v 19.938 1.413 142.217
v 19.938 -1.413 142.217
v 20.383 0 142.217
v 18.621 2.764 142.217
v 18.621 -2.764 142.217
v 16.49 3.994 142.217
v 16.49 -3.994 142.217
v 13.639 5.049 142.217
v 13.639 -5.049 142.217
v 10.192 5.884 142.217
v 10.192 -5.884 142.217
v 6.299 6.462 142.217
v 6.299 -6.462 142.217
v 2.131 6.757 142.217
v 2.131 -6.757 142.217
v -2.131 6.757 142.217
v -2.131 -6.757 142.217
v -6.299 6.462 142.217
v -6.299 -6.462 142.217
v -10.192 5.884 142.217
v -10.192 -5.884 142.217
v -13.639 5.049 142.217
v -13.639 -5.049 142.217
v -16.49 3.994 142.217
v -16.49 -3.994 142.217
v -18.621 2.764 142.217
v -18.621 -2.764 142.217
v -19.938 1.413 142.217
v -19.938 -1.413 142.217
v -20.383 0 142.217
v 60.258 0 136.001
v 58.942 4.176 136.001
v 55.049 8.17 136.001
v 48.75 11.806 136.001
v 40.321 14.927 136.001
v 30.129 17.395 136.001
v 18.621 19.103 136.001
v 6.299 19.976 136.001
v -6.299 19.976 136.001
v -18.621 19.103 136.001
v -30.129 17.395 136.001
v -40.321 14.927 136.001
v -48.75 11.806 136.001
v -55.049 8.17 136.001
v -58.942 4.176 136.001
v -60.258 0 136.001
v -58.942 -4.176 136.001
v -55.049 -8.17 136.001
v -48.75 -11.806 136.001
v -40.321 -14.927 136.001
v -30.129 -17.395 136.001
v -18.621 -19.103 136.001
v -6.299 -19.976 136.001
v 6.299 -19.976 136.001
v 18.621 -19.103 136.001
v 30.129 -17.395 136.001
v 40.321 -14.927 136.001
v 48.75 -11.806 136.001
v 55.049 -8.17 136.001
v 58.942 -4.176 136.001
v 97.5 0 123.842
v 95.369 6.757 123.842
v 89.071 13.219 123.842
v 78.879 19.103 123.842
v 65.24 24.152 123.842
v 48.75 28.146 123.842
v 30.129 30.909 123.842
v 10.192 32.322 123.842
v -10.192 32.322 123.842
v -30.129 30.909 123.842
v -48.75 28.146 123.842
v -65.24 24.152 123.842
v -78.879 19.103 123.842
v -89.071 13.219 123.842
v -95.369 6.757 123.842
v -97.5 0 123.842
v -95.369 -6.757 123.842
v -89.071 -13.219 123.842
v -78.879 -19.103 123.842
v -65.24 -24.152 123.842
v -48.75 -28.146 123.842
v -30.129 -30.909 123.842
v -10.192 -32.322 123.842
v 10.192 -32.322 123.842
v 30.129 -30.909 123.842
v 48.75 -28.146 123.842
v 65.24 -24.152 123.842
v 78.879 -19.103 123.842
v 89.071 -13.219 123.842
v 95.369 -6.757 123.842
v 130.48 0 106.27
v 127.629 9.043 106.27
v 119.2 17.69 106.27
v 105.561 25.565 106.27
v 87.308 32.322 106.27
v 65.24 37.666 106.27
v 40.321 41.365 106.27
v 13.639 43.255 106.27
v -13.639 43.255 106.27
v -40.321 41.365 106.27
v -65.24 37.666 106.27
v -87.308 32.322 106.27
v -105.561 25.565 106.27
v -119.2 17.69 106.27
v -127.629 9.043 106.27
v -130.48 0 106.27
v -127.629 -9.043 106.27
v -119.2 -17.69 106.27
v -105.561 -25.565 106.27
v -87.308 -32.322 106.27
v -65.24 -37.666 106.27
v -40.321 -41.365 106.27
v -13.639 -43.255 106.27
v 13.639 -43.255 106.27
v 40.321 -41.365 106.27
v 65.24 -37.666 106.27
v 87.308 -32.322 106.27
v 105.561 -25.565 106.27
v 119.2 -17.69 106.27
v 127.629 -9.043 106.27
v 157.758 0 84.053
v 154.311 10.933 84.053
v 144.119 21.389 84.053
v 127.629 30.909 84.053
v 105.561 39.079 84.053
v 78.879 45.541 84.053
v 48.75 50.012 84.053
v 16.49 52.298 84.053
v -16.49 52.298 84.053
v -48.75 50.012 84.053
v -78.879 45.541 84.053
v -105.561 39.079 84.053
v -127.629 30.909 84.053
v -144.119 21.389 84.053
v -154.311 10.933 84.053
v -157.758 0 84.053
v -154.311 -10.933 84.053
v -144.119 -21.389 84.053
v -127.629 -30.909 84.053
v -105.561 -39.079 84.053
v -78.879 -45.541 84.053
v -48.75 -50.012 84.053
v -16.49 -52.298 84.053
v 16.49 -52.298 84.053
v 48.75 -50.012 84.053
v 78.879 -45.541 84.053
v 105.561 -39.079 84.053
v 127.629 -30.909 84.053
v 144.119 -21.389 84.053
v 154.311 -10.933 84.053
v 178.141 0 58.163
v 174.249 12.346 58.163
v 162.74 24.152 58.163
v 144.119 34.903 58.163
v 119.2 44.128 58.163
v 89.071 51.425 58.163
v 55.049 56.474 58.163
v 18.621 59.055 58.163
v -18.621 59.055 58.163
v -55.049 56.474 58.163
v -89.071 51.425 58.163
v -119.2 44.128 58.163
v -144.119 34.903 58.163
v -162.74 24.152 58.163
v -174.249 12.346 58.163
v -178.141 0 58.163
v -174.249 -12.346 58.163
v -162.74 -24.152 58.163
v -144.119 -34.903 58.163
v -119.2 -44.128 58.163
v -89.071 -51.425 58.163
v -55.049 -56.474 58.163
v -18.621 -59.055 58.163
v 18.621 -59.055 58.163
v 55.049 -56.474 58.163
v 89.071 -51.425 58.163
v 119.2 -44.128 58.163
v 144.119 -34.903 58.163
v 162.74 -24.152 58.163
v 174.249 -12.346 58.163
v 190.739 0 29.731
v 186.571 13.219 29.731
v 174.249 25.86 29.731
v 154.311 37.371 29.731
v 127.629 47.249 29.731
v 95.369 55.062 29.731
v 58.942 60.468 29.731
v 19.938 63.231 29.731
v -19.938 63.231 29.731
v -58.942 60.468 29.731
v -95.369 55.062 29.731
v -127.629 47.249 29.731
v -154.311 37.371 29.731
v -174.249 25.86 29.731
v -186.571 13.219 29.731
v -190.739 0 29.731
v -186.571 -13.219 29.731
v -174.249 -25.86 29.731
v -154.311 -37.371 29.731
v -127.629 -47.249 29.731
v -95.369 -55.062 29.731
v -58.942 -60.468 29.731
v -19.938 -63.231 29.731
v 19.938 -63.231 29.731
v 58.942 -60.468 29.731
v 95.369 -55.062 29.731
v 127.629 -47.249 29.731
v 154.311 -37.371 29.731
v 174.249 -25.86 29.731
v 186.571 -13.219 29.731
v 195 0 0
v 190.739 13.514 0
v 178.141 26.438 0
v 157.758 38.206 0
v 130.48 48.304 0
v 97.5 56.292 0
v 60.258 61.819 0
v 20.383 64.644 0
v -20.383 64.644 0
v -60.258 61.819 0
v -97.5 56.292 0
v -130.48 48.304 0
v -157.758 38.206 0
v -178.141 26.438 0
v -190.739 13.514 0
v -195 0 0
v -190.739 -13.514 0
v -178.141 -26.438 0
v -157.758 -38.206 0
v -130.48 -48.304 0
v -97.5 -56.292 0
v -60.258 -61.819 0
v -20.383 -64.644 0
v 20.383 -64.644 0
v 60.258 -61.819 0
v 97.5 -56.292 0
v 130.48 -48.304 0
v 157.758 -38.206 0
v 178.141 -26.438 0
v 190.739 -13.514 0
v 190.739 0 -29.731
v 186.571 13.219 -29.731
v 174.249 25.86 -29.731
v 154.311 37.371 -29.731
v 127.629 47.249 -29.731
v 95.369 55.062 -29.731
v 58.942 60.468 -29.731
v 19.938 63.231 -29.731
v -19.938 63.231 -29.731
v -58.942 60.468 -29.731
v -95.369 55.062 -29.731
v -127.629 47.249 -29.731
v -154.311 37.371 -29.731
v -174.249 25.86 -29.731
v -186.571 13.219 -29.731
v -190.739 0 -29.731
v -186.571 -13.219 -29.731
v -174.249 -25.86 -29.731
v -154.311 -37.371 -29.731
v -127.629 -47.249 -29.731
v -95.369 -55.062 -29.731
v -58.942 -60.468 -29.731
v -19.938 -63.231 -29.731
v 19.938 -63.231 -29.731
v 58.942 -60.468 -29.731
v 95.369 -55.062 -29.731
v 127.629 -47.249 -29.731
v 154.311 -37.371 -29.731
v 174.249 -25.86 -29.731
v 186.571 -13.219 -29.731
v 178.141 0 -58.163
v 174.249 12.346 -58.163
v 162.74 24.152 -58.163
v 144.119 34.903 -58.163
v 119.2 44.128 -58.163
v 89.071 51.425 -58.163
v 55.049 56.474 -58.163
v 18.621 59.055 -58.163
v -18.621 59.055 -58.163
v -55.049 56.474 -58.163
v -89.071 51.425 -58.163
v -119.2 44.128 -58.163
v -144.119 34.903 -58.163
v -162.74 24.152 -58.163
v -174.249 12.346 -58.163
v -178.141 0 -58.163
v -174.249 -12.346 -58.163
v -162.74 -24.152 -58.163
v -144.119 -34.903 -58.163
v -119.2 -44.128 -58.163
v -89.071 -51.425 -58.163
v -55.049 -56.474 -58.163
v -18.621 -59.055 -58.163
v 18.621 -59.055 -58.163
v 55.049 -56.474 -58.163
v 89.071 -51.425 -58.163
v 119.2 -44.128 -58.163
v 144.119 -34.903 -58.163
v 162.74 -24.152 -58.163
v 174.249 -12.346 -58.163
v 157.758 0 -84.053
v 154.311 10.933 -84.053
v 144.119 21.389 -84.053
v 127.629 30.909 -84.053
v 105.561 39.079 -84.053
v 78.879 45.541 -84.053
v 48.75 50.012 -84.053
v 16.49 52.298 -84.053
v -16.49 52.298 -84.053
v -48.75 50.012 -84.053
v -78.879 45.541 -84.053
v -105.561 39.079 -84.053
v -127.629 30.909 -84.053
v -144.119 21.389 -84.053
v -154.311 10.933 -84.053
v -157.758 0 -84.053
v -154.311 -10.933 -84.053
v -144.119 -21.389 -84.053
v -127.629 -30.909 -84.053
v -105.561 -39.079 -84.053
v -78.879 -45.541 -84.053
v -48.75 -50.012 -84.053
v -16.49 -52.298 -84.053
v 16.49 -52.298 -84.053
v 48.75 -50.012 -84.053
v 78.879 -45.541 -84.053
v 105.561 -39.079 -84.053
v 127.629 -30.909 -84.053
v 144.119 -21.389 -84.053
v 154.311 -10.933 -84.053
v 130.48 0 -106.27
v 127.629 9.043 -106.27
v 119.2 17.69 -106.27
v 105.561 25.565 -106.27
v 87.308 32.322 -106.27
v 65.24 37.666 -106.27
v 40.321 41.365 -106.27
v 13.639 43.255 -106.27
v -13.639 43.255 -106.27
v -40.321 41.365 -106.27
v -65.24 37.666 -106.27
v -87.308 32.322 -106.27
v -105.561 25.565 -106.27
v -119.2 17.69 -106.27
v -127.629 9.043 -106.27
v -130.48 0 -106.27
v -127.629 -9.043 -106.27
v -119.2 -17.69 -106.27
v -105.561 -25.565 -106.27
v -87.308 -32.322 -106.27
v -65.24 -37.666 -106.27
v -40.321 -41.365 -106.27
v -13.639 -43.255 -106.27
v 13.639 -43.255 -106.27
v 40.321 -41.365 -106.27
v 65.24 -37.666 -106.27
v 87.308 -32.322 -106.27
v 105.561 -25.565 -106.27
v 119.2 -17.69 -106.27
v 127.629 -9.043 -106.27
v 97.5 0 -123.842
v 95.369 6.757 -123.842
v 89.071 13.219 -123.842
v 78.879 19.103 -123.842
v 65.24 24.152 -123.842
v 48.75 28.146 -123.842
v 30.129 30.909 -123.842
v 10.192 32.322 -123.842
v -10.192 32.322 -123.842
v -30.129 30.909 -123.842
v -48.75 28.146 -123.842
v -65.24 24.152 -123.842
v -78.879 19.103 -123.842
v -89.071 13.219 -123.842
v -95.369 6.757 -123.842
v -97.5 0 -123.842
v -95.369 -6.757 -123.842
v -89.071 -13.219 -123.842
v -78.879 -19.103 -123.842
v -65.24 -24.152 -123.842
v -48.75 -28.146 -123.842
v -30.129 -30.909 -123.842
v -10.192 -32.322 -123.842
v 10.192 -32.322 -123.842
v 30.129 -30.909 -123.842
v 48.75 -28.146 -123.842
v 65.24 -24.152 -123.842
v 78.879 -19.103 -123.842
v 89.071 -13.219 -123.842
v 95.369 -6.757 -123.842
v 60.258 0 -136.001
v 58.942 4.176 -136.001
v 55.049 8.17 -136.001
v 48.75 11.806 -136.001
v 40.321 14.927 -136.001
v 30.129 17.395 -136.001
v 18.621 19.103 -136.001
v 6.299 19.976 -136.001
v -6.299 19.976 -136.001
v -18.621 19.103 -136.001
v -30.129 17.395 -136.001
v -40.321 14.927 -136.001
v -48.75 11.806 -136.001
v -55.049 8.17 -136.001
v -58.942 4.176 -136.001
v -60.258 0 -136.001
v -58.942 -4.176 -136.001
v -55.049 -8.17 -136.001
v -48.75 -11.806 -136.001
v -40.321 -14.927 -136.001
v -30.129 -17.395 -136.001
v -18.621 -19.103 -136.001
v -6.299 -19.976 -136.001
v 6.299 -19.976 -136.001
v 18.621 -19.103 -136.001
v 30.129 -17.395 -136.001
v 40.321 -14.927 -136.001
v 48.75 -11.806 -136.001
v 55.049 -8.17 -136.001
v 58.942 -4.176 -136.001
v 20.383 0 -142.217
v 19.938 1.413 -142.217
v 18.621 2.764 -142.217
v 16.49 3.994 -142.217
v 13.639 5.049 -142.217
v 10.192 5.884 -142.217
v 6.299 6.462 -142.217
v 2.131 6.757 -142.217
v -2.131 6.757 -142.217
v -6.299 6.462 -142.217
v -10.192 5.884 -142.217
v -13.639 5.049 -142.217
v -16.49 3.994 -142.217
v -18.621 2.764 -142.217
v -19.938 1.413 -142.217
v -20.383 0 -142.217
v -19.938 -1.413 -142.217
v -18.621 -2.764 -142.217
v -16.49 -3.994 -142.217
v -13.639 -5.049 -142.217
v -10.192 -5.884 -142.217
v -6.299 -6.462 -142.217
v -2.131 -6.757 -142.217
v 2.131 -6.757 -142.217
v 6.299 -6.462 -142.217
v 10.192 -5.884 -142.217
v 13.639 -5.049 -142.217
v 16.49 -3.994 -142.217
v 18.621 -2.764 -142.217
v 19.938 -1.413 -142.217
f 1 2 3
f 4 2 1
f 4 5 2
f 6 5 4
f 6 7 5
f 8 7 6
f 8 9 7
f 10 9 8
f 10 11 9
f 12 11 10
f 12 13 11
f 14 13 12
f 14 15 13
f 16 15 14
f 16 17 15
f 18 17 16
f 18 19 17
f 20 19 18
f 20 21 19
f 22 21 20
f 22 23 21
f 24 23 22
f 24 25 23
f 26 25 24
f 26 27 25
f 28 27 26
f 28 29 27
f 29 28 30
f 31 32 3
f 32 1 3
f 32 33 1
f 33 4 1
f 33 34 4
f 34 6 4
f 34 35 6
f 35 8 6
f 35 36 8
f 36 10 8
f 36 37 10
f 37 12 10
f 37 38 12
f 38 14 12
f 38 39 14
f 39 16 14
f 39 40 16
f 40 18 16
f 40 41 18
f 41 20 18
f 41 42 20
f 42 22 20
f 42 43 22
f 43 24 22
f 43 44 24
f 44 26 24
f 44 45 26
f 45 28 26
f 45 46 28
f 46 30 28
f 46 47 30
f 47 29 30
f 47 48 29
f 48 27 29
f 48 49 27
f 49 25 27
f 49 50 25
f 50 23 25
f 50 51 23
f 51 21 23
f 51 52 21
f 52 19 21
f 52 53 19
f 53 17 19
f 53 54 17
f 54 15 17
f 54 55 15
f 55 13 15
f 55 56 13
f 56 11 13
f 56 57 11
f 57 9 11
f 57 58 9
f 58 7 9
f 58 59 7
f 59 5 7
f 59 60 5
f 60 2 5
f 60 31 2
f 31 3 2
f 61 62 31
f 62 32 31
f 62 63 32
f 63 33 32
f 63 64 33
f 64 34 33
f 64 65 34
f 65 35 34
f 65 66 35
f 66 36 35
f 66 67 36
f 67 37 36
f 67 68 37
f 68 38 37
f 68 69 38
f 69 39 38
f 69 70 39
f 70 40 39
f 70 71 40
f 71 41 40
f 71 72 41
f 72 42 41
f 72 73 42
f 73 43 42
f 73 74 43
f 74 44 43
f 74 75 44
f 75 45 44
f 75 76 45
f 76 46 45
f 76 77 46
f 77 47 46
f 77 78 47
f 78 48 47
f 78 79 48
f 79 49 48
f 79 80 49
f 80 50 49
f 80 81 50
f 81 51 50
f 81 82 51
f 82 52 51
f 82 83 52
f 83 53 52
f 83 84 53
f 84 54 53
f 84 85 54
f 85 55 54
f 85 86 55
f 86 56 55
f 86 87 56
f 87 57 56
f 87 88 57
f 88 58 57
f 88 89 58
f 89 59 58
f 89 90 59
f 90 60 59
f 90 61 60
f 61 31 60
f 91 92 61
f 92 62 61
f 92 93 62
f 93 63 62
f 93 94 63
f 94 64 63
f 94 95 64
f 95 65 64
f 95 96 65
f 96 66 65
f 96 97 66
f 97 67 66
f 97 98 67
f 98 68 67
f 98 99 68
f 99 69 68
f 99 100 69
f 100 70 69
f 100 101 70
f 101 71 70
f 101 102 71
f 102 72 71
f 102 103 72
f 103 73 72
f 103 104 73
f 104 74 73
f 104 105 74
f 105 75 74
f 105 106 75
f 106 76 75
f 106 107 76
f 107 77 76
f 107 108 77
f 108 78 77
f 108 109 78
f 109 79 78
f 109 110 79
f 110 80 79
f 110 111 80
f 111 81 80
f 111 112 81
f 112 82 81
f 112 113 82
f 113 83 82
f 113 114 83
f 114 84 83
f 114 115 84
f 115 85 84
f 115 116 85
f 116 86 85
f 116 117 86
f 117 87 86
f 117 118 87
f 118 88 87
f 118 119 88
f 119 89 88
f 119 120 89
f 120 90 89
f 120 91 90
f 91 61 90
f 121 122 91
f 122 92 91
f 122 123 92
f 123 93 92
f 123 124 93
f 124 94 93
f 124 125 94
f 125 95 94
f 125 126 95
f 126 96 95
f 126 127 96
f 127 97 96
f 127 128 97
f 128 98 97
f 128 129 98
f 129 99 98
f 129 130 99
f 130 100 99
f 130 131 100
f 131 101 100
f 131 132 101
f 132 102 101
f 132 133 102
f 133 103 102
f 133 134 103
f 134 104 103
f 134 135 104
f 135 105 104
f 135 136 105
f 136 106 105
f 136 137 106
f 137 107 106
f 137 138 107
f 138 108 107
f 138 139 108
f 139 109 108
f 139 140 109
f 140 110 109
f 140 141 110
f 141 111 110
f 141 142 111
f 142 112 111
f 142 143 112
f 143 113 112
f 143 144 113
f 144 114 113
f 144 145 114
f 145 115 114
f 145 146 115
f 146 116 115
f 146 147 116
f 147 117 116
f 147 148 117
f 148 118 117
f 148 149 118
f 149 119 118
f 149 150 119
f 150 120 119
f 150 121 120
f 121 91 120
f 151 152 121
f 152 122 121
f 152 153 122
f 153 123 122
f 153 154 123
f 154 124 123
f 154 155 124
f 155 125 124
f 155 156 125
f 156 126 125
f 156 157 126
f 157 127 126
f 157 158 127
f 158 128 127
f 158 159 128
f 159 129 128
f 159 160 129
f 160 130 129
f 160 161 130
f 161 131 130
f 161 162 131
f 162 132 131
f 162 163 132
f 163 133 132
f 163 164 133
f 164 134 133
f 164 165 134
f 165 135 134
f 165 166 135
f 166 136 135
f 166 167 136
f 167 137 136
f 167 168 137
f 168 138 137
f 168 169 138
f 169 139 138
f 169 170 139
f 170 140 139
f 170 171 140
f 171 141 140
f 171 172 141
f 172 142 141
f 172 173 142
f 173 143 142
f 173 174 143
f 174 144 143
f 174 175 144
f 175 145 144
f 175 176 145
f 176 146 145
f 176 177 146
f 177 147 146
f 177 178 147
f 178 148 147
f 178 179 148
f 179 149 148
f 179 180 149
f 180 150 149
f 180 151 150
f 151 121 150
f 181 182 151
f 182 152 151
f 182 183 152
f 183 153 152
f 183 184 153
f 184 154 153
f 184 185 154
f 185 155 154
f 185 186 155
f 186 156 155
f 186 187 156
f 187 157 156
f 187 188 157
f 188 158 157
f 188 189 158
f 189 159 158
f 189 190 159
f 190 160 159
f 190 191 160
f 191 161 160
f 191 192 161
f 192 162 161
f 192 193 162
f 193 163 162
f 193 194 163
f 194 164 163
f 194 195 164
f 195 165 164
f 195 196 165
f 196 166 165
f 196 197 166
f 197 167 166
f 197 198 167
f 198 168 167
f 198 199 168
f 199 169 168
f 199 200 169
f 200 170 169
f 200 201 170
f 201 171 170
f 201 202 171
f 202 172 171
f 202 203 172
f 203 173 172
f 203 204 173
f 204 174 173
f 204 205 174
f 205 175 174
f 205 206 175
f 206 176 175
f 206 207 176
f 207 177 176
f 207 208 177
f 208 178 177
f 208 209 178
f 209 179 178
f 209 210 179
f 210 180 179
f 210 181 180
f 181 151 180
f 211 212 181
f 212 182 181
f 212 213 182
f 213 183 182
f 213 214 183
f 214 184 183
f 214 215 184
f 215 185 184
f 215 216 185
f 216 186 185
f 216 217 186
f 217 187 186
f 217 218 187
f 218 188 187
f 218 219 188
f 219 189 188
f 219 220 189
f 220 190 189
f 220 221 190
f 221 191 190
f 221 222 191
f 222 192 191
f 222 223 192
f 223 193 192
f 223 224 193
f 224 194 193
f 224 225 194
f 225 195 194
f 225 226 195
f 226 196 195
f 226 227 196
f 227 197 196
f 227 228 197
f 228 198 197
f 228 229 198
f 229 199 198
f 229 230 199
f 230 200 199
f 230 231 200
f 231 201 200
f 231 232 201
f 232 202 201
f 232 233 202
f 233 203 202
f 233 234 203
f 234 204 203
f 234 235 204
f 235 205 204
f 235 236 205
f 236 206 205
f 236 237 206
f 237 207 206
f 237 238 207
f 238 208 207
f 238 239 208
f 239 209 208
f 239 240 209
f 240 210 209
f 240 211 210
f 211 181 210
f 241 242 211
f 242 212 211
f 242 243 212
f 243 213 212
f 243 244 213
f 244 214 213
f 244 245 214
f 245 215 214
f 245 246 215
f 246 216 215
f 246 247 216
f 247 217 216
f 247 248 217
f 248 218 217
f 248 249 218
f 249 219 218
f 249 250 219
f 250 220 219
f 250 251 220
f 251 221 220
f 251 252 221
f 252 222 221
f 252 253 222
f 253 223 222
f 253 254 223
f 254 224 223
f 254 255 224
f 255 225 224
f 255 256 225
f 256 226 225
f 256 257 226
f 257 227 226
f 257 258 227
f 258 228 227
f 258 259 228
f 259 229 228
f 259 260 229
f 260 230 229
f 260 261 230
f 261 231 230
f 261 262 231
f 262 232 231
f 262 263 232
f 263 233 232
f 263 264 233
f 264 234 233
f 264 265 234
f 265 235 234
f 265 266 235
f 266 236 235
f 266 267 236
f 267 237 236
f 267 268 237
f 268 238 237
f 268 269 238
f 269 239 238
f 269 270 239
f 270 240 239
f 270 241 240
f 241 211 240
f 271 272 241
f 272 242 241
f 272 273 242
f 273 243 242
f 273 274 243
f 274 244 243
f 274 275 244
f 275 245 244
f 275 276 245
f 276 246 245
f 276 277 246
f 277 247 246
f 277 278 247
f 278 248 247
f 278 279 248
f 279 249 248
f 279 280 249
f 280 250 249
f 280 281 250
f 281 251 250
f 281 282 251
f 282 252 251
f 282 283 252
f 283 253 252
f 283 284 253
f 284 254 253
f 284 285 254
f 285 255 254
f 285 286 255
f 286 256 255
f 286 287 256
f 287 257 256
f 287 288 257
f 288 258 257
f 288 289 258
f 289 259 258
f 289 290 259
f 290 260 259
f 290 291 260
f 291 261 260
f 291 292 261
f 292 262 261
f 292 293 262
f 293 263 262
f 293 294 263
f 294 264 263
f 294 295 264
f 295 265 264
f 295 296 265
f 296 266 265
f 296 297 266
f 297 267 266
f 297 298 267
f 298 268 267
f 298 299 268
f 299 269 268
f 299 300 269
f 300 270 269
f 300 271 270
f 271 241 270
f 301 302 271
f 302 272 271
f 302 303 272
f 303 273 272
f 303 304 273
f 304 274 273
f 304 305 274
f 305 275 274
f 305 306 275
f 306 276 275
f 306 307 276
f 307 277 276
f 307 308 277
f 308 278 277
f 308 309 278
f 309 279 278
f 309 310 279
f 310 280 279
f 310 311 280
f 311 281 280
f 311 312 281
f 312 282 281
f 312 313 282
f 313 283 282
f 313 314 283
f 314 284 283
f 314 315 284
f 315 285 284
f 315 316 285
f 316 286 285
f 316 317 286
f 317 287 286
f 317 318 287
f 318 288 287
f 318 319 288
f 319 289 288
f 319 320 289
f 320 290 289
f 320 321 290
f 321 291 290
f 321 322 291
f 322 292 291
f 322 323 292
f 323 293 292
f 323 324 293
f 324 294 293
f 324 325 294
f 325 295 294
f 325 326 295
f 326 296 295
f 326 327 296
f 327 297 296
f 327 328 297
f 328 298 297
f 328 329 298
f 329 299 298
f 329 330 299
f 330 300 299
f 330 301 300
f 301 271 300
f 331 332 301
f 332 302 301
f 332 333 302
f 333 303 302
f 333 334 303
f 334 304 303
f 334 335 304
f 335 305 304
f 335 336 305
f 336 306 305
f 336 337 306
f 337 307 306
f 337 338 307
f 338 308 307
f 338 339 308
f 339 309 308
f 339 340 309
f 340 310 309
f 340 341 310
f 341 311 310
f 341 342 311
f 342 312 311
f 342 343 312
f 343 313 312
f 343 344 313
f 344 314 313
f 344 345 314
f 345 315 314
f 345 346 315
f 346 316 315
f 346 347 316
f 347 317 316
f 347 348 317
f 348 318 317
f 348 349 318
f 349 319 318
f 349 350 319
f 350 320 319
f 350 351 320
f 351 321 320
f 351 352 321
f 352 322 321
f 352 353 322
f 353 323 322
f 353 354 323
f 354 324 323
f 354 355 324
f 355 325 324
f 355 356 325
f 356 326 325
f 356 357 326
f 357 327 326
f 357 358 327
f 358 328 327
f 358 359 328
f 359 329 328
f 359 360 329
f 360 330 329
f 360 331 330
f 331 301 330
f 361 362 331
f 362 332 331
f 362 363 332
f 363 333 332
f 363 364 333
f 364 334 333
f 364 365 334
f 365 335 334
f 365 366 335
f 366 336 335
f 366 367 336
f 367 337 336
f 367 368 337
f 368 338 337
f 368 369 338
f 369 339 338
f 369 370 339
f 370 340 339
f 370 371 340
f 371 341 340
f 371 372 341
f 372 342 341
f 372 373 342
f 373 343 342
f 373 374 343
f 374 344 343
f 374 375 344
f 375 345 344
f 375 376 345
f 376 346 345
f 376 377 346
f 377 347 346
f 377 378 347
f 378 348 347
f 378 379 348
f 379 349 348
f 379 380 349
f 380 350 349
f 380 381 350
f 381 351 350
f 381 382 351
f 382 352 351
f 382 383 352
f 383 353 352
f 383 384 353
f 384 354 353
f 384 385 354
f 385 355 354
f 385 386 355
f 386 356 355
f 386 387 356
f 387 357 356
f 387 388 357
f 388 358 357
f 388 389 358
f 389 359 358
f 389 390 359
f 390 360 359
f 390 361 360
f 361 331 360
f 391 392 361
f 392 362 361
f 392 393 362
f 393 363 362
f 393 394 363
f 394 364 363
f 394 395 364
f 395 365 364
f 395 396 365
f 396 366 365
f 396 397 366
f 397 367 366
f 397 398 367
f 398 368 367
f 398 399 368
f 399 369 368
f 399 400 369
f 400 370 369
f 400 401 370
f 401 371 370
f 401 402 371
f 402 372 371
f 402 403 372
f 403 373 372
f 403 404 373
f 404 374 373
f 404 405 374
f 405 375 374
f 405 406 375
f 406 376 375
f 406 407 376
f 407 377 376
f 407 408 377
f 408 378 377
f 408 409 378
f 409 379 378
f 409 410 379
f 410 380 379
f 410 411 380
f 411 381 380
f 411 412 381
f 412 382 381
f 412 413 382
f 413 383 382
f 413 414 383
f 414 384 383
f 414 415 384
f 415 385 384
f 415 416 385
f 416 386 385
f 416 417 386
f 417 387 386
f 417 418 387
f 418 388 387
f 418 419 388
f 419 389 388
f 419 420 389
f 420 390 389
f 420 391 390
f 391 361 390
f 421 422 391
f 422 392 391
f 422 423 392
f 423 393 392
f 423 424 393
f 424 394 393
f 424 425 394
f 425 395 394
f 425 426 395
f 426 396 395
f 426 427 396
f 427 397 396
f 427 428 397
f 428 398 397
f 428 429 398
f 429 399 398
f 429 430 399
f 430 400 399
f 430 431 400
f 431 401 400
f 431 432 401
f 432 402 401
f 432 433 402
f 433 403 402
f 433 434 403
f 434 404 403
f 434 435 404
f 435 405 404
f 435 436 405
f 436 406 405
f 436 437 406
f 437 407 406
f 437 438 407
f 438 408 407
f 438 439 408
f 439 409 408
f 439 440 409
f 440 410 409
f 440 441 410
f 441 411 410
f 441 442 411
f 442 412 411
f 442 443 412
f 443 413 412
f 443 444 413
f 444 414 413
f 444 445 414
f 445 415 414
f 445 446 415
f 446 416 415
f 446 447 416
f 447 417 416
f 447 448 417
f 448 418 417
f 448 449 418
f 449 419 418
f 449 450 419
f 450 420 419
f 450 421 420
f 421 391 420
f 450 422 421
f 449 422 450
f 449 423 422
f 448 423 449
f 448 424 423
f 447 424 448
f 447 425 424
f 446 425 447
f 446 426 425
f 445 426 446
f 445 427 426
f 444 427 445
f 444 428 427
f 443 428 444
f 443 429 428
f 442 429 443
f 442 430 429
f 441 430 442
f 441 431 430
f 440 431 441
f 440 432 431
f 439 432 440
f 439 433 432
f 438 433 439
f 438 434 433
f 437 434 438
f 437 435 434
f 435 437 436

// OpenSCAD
// Generated by SolidPython 1.0.1 on 2020-07-29 00:46:51


scale(v = [15, 5, 11]) {
	sphere(r = 13);
}
/***********************************************
*********      SolidPython code:      **********
************************************************
 
# import packages: SolidPython
from solid import *
from solid.utils import *
from itertools import chain, combinations, permutations


class Resize:

    def __init__(self, scad_file):
        self.scad_file = scad_file
        #self.scad_file = import_scad(scad_file)
        # cone/cylinder param:
        self.r1 = 0
        self.r2 = 0
        self.h = 0
        # rectangular prism param:
        self.w = 0
        self.l = 0
        # ellipse param:
        self.r = 0

    # import OpenScad code (file name corresponds to shape)


    # classify shape + parameters
    def assign(self, param1, param2, param3):
        if self.scad_file == 'cone.scad':
            self.r1 = param1
            self.r2 = param2
            self.h = param3
        elif self.scad_file == 'cylinder.scad':
            self.r1 = param1
            self.r2 = param2
            self.h = param3
        elif self.scad_file == 'rectangularPrism.scad':
            self.h = param1
            self.l = param2
            self.w = param3
        else:
            self.r = param1
            self.h = param2

    # resize parameters
    def iterate(self):
        x = range(3, 20, 2)
        i = 1
        if self.scad_file == 'cone.scad':
            tempList = list(permutations(x, 2))
            for temp in tempList:
                param1 = temp[0]
                param2 = temp[1]
                filepath = 'produced_scad_files/' + 'cone' + str(param1) + '_' + str(param2) + '_' + '.scad'
                scad_render_to_file(cylinder(h=param1, r1=param2, r2=0), filepath)

        elif self.scad_file == 'cylinder.scad':
            tempList = list(permutations(x, 3))
            for temp in tempList:
                param1 = temp[0]
                param2 = temp[1]
                filepath = 'produced_scad_files/' + 'cylinder' + str(param1) + '_' + str(param2) + '_' + '.scad'
                scad_render_to_file(cylinder(h=param1, r1=param2, r2=param2), filepath)

        elif self.scad_file == 'rectangularPrism.scad':
            tempList = list(permutations(x, 3))
            for temp in tempList:
                param1 = temp[0]
                param2 = temp[1]
                param3 = temp[2]
                filepath = 'produced_scad_files/' + 'rectangularPrism' + str(param1) + '_' + str(param2) + '_' + str(
                    param3) + '.scad'
                scad_render_to_file(cube(size=(param1, param2, param3)), filepath)

        elif self.scad_file == 'ellipse.scad':
            tempList = list(permutations(x, 4))
            for temp in tempList:
                param1 = temp[0]
                param2 = temp[1]
                param3 = temp[2]
                param4 = temp[3]
                filepath = 'produced_scad_files/' + 'ellipse' + str(param1) + '_' + str(param2) + '_' + str(param3) + '_' + str(param4) + '.scad'
                scad_render_to_file(scale([param1, param2, param3])(sphere(r=param4)), filepath)

    def render_to_scadfile(self):
        scad_render_to_file(scad, 'example.scad') 
 
************************************************/
